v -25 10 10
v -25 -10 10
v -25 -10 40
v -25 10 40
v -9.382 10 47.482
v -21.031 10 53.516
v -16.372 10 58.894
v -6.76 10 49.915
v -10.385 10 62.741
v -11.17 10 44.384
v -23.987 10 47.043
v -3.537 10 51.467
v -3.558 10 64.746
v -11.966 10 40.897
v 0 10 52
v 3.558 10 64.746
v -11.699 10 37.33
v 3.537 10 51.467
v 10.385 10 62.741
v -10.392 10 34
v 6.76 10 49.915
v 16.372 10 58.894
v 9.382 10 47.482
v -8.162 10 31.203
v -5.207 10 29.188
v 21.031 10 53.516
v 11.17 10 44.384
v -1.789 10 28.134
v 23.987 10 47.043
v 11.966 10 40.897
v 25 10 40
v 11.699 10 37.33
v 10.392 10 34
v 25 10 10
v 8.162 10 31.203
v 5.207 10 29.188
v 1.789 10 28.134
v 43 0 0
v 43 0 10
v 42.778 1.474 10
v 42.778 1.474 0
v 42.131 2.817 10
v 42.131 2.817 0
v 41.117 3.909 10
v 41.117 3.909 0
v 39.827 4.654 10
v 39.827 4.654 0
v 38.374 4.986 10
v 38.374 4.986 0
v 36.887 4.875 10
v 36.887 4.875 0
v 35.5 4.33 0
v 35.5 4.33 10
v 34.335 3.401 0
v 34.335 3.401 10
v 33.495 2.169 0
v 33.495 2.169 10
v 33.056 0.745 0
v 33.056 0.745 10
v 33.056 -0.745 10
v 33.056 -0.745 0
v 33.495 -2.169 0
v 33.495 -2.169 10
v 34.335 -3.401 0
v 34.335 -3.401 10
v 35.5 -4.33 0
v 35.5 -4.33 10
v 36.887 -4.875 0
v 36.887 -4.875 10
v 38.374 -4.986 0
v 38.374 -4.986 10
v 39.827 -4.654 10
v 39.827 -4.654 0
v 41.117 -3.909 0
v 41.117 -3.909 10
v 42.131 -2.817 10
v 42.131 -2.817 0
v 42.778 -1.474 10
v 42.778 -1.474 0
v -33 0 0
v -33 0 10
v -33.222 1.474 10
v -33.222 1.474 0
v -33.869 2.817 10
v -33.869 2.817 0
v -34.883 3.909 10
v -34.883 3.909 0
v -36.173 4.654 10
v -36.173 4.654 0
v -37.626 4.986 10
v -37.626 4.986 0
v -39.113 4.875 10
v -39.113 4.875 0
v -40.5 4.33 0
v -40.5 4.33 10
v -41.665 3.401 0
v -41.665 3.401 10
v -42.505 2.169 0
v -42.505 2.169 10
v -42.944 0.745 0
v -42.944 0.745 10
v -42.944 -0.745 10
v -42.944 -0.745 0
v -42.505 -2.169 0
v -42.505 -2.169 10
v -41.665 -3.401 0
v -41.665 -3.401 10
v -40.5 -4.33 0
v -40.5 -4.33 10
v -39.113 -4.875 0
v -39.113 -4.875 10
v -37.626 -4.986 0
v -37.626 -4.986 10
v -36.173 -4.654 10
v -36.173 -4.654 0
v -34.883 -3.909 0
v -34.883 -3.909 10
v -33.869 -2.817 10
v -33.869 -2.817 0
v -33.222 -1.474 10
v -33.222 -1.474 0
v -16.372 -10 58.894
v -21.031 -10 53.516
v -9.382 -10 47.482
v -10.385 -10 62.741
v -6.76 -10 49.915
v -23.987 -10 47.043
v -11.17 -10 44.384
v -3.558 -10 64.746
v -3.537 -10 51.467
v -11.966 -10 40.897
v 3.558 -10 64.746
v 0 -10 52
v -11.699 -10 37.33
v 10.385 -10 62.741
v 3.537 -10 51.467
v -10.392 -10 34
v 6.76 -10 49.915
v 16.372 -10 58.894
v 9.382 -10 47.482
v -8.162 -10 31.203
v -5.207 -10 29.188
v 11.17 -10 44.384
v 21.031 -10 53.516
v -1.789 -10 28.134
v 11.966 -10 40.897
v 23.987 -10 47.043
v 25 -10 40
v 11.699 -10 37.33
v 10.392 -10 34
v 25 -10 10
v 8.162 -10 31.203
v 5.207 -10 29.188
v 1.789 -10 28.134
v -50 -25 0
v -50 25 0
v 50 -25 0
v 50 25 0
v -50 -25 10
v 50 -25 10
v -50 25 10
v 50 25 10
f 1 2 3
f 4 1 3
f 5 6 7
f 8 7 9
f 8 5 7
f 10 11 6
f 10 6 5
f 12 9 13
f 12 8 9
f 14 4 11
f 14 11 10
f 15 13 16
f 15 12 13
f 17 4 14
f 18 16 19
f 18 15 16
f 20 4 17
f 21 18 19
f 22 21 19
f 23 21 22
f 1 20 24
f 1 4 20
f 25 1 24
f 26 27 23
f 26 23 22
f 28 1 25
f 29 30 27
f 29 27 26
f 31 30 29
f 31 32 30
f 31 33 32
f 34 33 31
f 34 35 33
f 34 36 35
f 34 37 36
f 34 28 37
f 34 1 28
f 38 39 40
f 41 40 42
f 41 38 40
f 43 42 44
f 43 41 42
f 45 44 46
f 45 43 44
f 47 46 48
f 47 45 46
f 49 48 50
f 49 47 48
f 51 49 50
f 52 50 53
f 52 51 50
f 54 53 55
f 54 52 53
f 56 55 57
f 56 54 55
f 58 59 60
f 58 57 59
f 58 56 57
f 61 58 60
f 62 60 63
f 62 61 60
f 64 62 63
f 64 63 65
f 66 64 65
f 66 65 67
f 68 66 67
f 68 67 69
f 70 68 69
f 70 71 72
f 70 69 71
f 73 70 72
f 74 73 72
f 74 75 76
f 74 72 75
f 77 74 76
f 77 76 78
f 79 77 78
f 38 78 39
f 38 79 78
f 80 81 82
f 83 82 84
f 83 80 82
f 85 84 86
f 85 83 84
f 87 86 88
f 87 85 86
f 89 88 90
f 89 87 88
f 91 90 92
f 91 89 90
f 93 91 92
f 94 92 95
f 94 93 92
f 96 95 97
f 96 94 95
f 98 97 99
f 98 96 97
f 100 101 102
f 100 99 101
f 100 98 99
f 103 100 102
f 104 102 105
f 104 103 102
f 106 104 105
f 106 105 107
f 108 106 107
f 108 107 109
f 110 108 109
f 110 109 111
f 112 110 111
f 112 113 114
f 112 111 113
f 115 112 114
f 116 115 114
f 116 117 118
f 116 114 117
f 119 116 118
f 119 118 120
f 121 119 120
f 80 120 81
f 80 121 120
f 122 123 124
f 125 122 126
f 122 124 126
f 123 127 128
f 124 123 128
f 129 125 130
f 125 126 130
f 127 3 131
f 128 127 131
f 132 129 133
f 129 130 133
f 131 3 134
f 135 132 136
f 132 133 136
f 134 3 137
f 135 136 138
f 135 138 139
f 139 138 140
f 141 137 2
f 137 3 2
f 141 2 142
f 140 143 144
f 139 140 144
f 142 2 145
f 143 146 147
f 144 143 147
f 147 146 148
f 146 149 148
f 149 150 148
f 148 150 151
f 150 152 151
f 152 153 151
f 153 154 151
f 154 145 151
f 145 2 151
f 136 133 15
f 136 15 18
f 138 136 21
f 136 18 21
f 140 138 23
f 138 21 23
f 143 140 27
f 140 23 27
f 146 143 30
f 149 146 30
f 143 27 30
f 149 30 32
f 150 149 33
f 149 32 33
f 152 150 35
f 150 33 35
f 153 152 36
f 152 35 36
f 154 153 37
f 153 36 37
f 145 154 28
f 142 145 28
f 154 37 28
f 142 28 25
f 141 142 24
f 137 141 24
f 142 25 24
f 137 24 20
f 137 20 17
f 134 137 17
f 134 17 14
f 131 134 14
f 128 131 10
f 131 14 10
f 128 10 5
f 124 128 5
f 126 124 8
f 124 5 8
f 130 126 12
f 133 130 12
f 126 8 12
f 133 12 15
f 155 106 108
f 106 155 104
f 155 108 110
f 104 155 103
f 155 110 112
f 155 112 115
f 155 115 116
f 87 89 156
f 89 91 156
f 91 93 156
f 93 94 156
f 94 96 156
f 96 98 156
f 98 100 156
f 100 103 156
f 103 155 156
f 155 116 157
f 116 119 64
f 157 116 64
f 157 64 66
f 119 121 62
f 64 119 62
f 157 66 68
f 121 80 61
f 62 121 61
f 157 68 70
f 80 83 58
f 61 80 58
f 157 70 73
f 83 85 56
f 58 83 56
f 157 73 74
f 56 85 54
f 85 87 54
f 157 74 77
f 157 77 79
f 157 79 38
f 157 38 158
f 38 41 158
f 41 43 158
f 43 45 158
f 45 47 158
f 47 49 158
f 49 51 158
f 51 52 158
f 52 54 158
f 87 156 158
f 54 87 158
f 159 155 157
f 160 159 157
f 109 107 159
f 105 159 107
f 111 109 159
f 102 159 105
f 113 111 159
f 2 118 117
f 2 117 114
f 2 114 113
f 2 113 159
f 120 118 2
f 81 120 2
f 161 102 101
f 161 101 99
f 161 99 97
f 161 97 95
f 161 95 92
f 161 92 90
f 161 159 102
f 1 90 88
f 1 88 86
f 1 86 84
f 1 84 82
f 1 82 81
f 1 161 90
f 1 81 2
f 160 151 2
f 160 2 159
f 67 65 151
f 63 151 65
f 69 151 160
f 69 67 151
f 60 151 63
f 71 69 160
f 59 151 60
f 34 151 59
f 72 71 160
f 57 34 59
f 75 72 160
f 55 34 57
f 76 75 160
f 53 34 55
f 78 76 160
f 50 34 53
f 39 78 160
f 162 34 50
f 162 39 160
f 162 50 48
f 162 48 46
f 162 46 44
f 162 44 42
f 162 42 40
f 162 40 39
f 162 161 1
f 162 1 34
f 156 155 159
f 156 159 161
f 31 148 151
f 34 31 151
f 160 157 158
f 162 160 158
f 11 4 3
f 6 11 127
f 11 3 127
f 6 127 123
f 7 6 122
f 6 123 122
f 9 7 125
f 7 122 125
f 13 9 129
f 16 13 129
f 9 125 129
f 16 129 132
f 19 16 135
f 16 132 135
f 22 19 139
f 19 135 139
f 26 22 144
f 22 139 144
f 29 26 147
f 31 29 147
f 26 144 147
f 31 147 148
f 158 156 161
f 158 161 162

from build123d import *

# Parameters (mm, degrees)
SKETCH_1_W          = 100
SKETCH_1_H          = 50
EXTRUDE_1_DEPTH     = 10
EXTRUDE_START       = -10
EXTRUDE_2_DEPTH     = 20
SKETCH_3_R          = 12
CUT_EXTRUDE_1_DEPTH = 101
SKETCH_4_R          = 5
CUT_EXTRUDE_2_DEPTH = 86.732140997


# Read off the part's stored shape, not the designer's step: 凸台-拉伸2
with BuildPart() as part:
    # 草图1 → 凸台-拉伸1 (new body)
    with BuildSketch(Plane.XY):
        Rectangle(SKETCH_1_W, SKETCH_1_H)
    extrude(amount=EXTRUDE_1_DEPTH)

    # 凸台-拉伸2 outline → 凸台-拉伸2 (add)
    with BuildSketch(Plane(origin=(0, 0, 0), x_dir=(1, 0, 0), z_dir=(0, 1, 0)).offset(EXTRUDE_START)):
        with BuildLine():
            Line((-25, -10), (-25, -40))
            ThreePointArc((-25, -40), (0, -65), (25, -40))
            Line((25, -40), (25, -10))
            Line((25, -10), (-25, -10))
        make_face()
    extrude(amount=EXTRUDE_2_DEPTH)

    # 草图3 → 切除-拉伸1 (cut, symmetric)
    with BuildSketch(Plane(origin=(0, 0, 0), x_dir=(1, 0, 0), z_dir=(0, 1, 0))):
        with Locations(Location((0, -40, 0), (0, 0, 270))):
            Circle(SKETCH_3_R)
    extrude(amount=CUT_EXTRUDE_1_DEPTH, both=True, mode=Mode.SUBTRACT)

    # 草图4 → 切除-拉伸2 (cut, through all)
    with BuildSketch(Plane.XY):
        with Locations((-38, 0)):
            Circle(SKETCH_4_R)
        with Locations((38, 0)):
            Circle(SKETCH_4_R)
    extrude(amount=CUT_EXTRUDE_2_DEPTH, mode=Mode.SUBTRACT)


solid = part.part
